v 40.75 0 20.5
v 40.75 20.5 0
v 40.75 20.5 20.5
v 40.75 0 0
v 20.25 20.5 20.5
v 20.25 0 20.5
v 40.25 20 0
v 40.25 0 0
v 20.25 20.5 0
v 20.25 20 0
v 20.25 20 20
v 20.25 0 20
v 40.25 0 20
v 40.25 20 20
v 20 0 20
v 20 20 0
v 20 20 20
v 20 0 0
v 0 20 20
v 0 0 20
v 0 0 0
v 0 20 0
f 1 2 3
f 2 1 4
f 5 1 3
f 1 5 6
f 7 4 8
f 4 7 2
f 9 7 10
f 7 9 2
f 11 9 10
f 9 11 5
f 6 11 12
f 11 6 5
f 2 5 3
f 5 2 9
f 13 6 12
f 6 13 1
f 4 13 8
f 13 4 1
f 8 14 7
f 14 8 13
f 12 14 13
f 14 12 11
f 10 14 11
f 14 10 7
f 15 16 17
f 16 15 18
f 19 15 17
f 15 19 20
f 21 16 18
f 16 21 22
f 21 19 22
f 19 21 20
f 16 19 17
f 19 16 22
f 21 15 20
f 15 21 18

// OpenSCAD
folga = 0.25;

encaixe = 20;

cube(encaixe);

translate([encaixe + folga,0,0])
difference() {
    cube(encaixe + folga*2);
    cube(encaixe);
}
